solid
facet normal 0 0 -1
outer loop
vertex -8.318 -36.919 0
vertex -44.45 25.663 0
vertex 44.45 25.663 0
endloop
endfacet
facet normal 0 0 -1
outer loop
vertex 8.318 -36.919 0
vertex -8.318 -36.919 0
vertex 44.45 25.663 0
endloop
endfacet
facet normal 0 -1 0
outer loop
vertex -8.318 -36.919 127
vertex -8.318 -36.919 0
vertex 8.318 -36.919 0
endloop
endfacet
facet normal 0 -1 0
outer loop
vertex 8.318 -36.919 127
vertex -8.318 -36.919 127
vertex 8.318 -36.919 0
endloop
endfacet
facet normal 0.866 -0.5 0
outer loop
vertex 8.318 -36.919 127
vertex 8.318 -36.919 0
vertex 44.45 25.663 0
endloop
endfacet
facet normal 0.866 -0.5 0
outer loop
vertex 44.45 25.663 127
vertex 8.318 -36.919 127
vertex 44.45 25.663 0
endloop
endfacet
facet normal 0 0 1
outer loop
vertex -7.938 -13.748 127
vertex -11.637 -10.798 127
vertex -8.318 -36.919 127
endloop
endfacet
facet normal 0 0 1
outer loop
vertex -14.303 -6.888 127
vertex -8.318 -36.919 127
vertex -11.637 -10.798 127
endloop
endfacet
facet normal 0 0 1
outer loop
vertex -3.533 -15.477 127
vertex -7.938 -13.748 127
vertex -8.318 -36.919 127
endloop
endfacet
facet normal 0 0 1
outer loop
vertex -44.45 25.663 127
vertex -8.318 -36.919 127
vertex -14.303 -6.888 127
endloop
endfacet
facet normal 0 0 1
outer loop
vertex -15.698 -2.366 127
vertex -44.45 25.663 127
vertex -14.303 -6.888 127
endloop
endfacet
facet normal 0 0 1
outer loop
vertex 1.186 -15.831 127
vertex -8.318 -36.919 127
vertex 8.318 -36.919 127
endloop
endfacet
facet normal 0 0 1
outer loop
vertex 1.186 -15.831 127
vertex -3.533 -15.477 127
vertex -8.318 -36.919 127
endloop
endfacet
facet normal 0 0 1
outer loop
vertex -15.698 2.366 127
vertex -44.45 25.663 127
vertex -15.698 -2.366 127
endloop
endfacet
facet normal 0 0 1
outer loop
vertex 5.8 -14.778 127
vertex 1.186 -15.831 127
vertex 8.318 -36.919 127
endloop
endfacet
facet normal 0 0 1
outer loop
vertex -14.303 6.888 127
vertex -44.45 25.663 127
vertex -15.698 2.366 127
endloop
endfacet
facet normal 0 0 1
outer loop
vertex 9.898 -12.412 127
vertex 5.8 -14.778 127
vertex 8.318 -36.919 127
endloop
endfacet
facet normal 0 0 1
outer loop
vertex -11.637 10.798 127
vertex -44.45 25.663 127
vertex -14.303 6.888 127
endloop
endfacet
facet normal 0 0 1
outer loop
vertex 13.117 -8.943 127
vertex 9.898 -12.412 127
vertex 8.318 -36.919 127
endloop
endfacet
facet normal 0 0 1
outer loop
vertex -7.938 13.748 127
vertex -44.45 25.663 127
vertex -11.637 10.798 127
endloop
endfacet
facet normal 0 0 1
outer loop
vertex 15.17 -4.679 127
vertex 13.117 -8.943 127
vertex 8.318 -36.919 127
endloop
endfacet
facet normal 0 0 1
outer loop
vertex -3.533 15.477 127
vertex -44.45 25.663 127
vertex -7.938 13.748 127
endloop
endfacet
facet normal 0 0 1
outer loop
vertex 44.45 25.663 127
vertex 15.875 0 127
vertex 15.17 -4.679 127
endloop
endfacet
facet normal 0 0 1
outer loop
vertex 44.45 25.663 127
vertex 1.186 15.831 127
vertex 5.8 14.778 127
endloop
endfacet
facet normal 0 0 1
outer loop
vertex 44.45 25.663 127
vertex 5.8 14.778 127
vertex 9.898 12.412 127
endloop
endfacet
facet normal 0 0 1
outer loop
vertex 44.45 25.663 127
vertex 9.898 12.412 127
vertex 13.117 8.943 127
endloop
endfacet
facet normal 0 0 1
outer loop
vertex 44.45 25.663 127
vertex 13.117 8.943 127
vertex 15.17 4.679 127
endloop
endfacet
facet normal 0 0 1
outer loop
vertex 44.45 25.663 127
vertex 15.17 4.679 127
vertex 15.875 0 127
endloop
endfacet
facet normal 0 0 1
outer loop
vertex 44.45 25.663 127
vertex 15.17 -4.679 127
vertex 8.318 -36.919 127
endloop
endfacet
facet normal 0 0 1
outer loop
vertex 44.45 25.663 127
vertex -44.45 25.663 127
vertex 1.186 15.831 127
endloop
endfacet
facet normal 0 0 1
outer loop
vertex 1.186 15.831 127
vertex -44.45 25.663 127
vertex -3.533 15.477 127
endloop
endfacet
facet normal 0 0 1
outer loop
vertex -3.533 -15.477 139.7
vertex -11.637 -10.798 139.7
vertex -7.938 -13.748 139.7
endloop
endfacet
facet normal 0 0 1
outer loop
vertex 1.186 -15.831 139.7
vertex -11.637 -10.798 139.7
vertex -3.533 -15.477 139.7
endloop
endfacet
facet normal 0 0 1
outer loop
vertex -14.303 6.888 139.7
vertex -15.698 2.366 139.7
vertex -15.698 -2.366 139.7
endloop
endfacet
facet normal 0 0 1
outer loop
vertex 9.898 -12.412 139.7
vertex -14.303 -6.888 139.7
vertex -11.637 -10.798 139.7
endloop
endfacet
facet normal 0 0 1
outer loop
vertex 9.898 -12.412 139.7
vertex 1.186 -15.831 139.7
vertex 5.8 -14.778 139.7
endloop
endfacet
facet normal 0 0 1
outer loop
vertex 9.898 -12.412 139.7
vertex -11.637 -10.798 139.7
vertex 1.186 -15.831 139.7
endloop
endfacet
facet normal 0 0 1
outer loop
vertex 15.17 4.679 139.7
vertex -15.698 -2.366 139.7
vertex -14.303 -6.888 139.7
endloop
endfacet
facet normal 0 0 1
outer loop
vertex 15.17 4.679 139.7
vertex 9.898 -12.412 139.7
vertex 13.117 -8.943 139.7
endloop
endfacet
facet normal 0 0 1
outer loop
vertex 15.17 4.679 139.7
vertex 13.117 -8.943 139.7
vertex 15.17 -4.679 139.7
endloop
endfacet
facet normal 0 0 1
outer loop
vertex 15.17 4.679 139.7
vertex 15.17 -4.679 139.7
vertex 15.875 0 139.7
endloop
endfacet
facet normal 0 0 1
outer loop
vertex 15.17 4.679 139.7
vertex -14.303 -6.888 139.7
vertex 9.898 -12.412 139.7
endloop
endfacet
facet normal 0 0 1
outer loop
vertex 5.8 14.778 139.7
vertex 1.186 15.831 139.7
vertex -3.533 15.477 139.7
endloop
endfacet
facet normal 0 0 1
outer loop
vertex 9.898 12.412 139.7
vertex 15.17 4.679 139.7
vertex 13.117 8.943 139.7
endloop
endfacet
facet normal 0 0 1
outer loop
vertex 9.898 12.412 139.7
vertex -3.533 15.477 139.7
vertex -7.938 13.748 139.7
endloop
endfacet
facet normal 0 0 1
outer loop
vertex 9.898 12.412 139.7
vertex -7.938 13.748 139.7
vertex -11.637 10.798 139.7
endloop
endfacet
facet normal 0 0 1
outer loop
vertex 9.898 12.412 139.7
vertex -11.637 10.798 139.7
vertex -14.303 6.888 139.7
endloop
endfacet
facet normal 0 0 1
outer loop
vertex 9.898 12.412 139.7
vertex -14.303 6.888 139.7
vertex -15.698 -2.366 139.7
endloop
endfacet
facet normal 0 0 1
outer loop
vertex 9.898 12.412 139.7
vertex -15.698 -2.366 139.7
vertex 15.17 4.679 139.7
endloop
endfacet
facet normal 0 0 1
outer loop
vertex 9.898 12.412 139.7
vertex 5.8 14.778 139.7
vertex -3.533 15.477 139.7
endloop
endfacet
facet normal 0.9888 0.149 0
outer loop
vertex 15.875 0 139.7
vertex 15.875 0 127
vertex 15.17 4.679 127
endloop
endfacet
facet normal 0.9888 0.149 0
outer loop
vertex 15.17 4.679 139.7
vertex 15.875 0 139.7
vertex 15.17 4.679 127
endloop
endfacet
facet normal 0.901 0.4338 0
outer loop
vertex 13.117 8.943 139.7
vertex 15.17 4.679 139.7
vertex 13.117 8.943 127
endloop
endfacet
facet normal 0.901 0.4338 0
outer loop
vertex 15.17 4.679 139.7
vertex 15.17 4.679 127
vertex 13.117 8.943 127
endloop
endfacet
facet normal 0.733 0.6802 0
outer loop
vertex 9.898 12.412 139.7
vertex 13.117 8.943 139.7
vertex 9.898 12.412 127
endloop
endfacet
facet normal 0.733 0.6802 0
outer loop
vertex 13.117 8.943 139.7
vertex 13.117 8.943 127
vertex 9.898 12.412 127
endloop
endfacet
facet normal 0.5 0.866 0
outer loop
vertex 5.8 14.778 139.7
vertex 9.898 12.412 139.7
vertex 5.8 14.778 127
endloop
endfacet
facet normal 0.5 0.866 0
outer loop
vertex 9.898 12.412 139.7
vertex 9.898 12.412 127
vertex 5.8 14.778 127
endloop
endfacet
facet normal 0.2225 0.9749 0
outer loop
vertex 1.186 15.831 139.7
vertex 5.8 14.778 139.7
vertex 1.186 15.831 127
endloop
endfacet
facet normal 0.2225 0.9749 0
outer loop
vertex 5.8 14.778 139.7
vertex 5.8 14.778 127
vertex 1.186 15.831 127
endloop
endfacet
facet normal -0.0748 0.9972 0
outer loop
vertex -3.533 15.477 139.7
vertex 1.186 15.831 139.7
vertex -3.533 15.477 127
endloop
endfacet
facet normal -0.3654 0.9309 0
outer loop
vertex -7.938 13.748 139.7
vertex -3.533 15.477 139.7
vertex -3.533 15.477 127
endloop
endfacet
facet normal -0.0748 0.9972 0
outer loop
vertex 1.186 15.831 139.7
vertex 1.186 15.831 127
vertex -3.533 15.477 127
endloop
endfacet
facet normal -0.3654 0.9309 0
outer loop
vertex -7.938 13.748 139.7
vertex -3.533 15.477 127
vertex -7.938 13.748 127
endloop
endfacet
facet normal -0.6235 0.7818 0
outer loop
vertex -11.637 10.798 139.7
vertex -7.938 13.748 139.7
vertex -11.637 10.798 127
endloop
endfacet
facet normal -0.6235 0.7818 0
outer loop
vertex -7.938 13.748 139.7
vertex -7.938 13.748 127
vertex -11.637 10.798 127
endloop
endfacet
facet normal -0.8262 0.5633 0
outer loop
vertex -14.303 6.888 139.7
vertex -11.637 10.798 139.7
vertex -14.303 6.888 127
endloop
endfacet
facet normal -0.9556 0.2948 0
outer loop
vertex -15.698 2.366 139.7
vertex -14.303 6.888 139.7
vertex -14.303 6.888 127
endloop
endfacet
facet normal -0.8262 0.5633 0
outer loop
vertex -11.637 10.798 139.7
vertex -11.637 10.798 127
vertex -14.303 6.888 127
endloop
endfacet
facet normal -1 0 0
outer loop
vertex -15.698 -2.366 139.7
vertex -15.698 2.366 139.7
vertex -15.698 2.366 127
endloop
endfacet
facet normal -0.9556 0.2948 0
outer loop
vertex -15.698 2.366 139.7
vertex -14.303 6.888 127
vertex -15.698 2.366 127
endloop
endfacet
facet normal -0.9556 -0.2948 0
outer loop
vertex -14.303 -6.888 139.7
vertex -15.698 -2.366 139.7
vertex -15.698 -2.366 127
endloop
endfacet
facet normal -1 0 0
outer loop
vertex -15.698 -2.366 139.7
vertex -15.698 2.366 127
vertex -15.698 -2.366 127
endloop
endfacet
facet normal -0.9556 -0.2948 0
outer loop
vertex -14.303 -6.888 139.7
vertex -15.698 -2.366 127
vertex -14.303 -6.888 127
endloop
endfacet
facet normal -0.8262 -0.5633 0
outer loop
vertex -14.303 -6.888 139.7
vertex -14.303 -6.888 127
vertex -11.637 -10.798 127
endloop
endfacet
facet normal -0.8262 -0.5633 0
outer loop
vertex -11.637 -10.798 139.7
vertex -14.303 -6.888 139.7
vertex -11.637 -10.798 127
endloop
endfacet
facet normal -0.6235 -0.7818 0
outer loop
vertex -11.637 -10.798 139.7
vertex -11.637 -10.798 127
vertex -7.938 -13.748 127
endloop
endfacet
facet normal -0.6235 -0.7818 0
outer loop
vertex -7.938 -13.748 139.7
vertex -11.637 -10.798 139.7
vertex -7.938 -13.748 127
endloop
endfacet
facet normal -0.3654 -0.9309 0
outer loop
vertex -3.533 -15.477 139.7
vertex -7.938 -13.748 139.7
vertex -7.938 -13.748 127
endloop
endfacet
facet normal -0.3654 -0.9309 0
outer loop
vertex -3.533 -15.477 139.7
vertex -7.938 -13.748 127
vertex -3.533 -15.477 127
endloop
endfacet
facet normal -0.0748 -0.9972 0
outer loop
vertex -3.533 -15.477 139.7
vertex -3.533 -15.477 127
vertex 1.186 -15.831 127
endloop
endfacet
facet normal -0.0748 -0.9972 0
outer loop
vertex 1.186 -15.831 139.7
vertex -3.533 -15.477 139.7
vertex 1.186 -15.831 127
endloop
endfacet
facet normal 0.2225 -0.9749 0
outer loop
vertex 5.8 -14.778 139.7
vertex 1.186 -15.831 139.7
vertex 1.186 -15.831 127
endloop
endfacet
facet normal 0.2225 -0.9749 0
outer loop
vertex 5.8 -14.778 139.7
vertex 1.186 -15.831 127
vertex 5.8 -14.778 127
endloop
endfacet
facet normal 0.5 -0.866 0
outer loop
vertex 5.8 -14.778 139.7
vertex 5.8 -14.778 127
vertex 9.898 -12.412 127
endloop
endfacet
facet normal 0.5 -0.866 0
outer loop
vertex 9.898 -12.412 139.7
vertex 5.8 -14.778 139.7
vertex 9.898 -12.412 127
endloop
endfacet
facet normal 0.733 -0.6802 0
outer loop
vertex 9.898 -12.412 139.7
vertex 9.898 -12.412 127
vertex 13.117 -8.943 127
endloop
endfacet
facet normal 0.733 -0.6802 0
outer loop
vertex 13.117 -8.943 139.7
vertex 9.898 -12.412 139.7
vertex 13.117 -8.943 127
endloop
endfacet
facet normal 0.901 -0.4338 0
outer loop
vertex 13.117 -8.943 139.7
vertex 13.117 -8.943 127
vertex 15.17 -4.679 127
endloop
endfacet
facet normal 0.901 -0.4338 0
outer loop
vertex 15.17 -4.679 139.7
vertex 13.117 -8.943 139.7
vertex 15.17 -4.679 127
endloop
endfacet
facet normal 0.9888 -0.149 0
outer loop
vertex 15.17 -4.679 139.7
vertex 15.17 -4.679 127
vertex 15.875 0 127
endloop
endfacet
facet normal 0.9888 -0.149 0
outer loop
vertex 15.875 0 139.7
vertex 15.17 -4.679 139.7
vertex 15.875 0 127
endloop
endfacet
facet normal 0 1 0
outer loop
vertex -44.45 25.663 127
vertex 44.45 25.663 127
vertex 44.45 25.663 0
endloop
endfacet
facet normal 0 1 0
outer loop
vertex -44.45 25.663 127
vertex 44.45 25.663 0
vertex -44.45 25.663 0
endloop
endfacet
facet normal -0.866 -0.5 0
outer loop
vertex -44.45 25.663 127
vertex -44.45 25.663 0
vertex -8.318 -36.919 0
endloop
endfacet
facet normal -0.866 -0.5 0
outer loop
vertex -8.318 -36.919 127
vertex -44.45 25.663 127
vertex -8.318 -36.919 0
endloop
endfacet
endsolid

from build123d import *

# Parameters (mm, degrees)
F1_DEPTH = 127
F2_W     = 89.568419
F2_H     = 63.5
F3_DEPTH = 215.9
F4_R     = 15.875
F5_DEPTH = 139.7


with BuildPart() as f1:
    # F0 (on Top) → F1 (new body)
    with BuildSketch(Plane.XY):
        Polygon((44.45, 25.663219), (-44.45, 25.663219), (0, -51.326439), align=None)
    extrude(amount=F1_DEPTH)

    # F2 (on Top) → F3 (intersect)
    with BuildSketch(Plane.XY):
        with Locations((-0.249351, -5.168639)):
            Rectangle(F2_W, F2_H)
    extrude(amount=F3_DEPTH, mode=Mode.INTERSECT)

    # F4 (on Top) → F5 (join)
    with BuildSketch(Plane.XY):
        Circle(F4_R)
    extrude(amount=F5_DEPTH)


solid = f1.part
